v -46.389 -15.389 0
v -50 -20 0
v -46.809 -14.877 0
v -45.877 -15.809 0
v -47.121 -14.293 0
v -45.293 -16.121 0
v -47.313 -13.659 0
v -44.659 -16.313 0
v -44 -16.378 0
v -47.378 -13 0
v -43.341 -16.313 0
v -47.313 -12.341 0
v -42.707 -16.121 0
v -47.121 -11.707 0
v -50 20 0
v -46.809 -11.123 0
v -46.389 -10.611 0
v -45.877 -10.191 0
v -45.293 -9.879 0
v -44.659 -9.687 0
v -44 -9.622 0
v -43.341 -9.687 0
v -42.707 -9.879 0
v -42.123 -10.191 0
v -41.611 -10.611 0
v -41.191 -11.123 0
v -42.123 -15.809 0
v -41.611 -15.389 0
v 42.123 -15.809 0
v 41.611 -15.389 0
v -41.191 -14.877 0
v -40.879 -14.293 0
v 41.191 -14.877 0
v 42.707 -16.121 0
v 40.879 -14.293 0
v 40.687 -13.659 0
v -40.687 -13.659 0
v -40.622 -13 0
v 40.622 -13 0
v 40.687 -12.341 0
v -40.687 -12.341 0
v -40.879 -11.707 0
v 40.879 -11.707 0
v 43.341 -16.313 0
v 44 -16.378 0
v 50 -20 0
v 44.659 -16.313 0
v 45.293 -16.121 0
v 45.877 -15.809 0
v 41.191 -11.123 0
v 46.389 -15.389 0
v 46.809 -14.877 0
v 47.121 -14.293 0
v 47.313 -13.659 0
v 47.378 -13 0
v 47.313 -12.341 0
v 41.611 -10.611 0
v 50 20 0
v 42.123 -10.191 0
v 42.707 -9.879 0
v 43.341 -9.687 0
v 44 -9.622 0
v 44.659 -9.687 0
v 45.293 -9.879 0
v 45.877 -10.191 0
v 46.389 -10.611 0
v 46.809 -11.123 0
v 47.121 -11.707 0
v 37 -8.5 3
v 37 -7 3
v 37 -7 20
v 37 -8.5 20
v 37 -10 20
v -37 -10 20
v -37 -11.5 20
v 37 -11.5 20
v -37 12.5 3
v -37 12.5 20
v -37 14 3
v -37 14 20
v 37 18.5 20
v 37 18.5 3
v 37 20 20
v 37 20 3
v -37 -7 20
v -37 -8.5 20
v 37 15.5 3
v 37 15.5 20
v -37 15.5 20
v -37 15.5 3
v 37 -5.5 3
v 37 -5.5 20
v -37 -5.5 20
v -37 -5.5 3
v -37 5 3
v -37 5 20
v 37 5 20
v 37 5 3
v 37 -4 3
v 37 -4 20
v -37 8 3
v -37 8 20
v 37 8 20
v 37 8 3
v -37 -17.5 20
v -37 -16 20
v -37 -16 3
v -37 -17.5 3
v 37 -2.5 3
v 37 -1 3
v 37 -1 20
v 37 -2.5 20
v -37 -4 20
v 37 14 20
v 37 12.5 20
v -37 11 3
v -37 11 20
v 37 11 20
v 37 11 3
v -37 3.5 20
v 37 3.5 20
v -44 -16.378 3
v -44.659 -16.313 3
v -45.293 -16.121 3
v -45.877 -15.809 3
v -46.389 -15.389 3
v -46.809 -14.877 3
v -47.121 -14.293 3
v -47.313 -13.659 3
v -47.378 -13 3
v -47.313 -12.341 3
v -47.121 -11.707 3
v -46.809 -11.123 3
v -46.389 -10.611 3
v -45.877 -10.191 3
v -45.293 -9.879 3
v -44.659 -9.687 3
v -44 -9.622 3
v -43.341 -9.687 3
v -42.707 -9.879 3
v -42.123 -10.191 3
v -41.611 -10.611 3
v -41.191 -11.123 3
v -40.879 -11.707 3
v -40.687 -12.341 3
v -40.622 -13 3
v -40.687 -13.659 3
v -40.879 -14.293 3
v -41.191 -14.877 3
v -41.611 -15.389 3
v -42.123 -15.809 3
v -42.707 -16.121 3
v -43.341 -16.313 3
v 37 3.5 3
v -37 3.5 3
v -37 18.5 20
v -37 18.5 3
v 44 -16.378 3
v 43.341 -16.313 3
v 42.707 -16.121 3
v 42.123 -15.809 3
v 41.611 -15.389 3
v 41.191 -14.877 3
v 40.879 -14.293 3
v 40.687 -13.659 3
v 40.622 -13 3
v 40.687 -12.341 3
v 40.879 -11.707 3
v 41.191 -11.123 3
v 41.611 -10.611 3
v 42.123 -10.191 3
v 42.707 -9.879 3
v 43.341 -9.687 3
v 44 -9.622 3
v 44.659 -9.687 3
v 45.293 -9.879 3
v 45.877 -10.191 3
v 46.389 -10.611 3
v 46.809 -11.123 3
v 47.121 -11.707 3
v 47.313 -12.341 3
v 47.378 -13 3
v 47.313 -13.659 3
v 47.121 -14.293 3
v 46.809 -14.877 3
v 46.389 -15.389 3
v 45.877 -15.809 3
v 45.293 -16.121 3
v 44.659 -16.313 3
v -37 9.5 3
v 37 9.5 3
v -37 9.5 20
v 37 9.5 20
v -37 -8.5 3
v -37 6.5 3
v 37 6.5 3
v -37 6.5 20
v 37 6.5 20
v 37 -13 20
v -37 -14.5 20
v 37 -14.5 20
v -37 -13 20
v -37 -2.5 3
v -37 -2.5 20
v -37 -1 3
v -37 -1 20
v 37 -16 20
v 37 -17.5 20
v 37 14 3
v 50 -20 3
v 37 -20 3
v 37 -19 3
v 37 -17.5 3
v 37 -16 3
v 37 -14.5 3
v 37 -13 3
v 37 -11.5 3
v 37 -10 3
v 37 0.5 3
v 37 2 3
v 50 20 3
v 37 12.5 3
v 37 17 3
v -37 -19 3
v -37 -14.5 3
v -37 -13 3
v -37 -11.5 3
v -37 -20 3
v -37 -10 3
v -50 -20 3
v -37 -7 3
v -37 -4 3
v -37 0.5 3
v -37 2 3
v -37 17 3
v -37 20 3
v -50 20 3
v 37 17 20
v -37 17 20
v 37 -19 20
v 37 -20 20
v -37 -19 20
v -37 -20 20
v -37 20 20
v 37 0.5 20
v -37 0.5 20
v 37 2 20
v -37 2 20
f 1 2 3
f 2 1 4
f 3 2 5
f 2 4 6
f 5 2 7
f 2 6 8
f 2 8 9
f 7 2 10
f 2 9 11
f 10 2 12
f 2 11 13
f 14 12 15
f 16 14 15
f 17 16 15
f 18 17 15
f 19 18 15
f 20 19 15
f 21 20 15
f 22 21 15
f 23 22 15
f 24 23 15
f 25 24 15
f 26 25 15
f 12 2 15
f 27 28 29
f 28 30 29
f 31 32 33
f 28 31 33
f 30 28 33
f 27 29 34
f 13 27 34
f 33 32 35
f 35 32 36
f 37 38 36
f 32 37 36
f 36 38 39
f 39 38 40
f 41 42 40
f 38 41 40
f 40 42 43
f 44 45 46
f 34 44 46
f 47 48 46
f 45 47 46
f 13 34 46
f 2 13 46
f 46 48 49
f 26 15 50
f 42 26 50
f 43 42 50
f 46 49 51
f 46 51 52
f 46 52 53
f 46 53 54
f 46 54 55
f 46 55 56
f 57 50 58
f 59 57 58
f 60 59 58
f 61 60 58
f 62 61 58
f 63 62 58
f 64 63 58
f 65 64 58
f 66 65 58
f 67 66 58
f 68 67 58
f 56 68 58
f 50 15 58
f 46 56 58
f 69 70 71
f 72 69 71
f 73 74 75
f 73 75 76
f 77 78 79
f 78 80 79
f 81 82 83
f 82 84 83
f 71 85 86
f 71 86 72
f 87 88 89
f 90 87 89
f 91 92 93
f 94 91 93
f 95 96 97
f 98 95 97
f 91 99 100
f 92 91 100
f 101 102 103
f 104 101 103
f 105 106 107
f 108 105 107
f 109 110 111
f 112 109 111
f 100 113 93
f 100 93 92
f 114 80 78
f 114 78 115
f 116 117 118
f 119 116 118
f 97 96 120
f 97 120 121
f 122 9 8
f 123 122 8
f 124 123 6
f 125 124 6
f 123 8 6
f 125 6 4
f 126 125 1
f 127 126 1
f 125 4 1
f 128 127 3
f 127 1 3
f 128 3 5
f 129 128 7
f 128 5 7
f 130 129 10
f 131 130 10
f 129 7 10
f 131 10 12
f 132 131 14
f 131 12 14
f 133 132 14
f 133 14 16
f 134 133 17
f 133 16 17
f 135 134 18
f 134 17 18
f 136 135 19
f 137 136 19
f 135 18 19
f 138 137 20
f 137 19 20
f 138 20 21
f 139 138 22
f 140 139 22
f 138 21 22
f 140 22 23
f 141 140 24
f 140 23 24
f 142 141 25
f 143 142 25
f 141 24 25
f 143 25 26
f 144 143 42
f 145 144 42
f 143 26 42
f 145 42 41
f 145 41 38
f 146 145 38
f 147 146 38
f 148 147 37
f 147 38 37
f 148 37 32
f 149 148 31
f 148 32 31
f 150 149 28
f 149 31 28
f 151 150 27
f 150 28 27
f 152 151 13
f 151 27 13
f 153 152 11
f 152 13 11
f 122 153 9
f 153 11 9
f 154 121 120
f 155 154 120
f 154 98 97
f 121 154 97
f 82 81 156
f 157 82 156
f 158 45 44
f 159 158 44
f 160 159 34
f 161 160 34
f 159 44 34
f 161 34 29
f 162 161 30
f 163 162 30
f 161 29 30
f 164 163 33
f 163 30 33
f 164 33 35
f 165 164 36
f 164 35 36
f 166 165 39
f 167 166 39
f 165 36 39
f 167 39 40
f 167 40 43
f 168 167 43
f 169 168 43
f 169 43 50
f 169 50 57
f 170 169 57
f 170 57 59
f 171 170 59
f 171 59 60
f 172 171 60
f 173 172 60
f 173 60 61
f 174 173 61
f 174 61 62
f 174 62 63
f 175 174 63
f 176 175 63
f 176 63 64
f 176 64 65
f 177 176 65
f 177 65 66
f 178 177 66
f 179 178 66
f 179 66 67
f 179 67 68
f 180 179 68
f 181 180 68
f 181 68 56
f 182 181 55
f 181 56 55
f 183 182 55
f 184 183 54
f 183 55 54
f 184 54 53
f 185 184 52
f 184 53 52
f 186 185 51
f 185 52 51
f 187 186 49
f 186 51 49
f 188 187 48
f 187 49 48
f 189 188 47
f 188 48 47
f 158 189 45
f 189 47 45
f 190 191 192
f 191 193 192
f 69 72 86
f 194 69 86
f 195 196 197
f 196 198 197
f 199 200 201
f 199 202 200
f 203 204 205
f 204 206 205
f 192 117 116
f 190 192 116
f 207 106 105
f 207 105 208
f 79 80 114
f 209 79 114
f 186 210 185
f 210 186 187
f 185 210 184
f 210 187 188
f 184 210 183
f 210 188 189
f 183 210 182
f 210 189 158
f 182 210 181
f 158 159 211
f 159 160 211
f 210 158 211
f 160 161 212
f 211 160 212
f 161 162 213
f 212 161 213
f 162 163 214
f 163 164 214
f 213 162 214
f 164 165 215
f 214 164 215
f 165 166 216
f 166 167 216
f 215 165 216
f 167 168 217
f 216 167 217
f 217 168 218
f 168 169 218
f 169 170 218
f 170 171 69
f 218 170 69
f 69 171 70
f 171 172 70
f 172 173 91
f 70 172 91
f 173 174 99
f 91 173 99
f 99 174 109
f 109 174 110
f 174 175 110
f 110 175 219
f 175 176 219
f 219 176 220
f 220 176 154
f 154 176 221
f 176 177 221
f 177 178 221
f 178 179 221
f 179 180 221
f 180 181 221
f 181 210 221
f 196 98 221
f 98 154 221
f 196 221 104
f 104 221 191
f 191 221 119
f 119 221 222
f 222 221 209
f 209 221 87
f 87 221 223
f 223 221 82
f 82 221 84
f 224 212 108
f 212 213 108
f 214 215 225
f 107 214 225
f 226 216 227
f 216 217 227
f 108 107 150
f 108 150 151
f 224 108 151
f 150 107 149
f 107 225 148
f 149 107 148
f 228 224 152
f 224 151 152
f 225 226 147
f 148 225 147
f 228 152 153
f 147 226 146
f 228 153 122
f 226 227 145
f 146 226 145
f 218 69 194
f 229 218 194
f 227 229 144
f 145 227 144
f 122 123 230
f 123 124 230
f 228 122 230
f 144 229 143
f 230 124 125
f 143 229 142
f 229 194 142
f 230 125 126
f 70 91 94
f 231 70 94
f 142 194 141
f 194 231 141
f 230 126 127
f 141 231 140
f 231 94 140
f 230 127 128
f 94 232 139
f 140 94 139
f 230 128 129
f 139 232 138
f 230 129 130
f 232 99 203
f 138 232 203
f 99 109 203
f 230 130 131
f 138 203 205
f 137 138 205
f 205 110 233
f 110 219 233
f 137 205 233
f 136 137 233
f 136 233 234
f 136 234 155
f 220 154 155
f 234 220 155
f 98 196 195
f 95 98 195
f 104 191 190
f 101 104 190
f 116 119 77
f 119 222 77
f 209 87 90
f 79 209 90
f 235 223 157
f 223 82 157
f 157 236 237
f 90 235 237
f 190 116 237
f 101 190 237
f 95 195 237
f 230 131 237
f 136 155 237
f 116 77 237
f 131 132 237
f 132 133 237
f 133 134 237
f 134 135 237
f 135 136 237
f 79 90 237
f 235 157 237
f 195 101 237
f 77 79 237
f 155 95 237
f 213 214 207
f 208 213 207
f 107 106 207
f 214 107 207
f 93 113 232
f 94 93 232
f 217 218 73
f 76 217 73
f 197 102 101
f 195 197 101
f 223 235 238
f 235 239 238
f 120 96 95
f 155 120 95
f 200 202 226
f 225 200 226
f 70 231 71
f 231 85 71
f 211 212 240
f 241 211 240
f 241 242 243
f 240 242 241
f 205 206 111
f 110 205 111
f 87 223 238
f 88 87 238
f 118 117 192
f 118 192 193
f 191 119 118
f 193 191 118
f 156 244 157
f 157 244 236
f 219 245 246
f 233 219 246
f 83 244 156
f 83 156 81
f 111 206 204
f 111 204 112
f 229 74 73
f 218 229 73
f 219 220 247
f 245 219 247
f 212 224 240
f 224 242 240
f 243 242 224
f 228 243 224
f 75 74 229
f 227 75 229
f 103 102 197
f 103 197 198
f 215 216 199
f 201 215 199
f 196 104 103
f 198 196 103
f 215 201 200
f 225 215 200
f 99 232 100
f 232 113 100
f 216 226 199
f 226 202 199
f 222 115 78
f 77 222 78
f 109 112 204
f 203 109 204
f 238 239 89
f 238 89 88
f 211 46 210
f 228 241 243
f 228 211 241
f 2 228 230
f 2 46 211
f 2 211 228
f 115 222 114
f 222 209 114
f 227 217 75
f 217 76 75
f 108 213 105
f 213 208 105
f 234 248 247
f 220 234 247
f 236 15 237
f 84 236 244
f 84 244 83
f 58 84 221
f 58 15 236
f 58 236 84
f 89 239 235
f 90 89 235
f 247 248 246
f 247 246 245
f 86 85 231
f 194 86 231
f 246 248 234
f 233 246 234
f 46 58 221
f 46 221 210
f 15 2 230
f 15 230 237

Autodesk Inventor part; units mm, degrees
ref_plane "YZ Plane" through (0, 0, 0) normal (1, 0, 0) x (0, 1, 0)
ref_plane "XZ Plane" through (0, 0, 0) normal (0, 1, 0) x (-1, 0, 0)
sketch "Sketch1" plane through (0, 0, 0) normal (0, 0, 1) x (1, 0, 0)
  line L0 (-50, 20) -> (50, 20)
  line L1 (50, 20) -> (50, -20)
  line L2 (50, -20) -> (-50, -20)
  line L3 (-50, -20) -> (-50, 20)
  line L4 (-50, 20) -> (50, -20) construction
  line L5 (50, 20) -> (-50, -20) construction
  point P0 (0, 0)
  dimension "d0" = 100
  dimension "d1" = 40
extrude "Extrusion1" add sketch "Sketch1" along normal blind 20
sketch "Sketch2" plane through (0, 0, 20) normal (0, 0, 1) x (1, 0, 0)
  line L0 (-50, -20) -> (50, -20) projected
  line L1 (50, -20) -> (50, 20) projected
  line L2 (50, 20) -> (-50, 20) projected
  line L3 (-50, 20) -> (-50, -20) projected
  line L4 (-70, 0) -> (70, 0) projected
  line L5 (0, -28) -> (0, 28) projected
  line L6 (50, -20) -> (50, 20) projected
  line L7 (-50, 17) -> (50, 17)
  line L8 (50, 17) -> (50, 18.5)
  line L9 (50, 18.5) -> (-50, 18.5)
  line L10 (-50, 18.5) -> (-50, 17)
  line L11 (-50, 17) -> (50, 18.5) construction
  line L12 (50, 17) -> (-50, 18.5) construction
  point P0 (0, 0)
  point P1 (0, 17.75)
  dimension "d4" = 1.5
  dimension "d6" = 1.5
extrude "Extrusion2" cut sketch "Sketch2" against normal blind 17 contours L3 L9 L5 L7 | L5 L9 L1 L7
pattern_linear "Rectangular Pattern1" count 13 spacing 3 along (0, -1, 0) of "Extrusion2"
ref_plane "Work Plane1" through (0, 0, 20) normal (0, 0, 1) x (1, 0, 0)
sketch "Sketch4" plane through (0, 0, 20) normal (0, 0, 1) x (1, 0, 0)
  line L0 (0, -28) -> (0, 28) projected
  line L1 (50, 0.5) -> (50, -1) projected
  line L2 (50, 20) -> (-50, 20) projected
  line L3 (-50, -20) -> (50, -20) projected
  line L4 (-50, -4) -> (-50, -5.5) projected
  point P0 (0, 0)
  point P1 (44, -13)
  point P2 (-44, -13)
  dimension "d22" = 6
  dimension "d30" = 7
  dimension "d31" = 7
  dimension "d32" = 6
hole "Hole2" at (44, -13, 20) at (-44, -13, 20) direction (0, 0, -1) diameter 6.756 end through all clearance for "Socket Head Cap Screw" size "1/4" standard "Ansi Unified Screw Threads"
sketch "Sketch5" plane through (-50, 20, 0) normal (0, 1, 0) x (1, 0, 0)
  line L0 (-20, 0) -> (120, 0) projected
  line L1 (50, 4) -> (50, -24) projected
  line L2 (90.622, -3) -> (9.378, -3) projected
  line L3 (0, -20) -> (13, -20)
  line L4 (13, -20) -> (13, -3)
  line L5 (13, -3) -> (0, -3)
  line L6 (0, -3) -> (0, -20)
  line L7 (0, 0) -> (0, -20) projected
  point P0 (50, 0)
  dimension "d33" = 13
extrude "Extrusion3" cut sketch "Sketch5" against normal up to surface (40 mm away) contours L5 L2 L4 L3 L6
mirror "Mirror1" about plane through (0, 0, 0) normal (1, 0, 0) of "Extrusion3"
equation "\"d28\" = Thickness"
equation "\"BendRadius\" = Thickness"
equation "\"BendReliefWidth\" = Thickness"
equation "\"BendReliefDepth\" = 0.5 * Thickness"
equation "\"CornerReliefSize\" = 4 * Thickness"
equation "\"MinimumRemnant\" = 2 * Thickness"
equation "\"TransitionRadius\" = BendRadius"
equation "\"JacobiRadiusSize\" = BendRadius"
equation "\"GapSize\" = Thickness"
equation "\"Thickness\" = 3.048"
properties part number "ExternalHeatSinkandClamp"
